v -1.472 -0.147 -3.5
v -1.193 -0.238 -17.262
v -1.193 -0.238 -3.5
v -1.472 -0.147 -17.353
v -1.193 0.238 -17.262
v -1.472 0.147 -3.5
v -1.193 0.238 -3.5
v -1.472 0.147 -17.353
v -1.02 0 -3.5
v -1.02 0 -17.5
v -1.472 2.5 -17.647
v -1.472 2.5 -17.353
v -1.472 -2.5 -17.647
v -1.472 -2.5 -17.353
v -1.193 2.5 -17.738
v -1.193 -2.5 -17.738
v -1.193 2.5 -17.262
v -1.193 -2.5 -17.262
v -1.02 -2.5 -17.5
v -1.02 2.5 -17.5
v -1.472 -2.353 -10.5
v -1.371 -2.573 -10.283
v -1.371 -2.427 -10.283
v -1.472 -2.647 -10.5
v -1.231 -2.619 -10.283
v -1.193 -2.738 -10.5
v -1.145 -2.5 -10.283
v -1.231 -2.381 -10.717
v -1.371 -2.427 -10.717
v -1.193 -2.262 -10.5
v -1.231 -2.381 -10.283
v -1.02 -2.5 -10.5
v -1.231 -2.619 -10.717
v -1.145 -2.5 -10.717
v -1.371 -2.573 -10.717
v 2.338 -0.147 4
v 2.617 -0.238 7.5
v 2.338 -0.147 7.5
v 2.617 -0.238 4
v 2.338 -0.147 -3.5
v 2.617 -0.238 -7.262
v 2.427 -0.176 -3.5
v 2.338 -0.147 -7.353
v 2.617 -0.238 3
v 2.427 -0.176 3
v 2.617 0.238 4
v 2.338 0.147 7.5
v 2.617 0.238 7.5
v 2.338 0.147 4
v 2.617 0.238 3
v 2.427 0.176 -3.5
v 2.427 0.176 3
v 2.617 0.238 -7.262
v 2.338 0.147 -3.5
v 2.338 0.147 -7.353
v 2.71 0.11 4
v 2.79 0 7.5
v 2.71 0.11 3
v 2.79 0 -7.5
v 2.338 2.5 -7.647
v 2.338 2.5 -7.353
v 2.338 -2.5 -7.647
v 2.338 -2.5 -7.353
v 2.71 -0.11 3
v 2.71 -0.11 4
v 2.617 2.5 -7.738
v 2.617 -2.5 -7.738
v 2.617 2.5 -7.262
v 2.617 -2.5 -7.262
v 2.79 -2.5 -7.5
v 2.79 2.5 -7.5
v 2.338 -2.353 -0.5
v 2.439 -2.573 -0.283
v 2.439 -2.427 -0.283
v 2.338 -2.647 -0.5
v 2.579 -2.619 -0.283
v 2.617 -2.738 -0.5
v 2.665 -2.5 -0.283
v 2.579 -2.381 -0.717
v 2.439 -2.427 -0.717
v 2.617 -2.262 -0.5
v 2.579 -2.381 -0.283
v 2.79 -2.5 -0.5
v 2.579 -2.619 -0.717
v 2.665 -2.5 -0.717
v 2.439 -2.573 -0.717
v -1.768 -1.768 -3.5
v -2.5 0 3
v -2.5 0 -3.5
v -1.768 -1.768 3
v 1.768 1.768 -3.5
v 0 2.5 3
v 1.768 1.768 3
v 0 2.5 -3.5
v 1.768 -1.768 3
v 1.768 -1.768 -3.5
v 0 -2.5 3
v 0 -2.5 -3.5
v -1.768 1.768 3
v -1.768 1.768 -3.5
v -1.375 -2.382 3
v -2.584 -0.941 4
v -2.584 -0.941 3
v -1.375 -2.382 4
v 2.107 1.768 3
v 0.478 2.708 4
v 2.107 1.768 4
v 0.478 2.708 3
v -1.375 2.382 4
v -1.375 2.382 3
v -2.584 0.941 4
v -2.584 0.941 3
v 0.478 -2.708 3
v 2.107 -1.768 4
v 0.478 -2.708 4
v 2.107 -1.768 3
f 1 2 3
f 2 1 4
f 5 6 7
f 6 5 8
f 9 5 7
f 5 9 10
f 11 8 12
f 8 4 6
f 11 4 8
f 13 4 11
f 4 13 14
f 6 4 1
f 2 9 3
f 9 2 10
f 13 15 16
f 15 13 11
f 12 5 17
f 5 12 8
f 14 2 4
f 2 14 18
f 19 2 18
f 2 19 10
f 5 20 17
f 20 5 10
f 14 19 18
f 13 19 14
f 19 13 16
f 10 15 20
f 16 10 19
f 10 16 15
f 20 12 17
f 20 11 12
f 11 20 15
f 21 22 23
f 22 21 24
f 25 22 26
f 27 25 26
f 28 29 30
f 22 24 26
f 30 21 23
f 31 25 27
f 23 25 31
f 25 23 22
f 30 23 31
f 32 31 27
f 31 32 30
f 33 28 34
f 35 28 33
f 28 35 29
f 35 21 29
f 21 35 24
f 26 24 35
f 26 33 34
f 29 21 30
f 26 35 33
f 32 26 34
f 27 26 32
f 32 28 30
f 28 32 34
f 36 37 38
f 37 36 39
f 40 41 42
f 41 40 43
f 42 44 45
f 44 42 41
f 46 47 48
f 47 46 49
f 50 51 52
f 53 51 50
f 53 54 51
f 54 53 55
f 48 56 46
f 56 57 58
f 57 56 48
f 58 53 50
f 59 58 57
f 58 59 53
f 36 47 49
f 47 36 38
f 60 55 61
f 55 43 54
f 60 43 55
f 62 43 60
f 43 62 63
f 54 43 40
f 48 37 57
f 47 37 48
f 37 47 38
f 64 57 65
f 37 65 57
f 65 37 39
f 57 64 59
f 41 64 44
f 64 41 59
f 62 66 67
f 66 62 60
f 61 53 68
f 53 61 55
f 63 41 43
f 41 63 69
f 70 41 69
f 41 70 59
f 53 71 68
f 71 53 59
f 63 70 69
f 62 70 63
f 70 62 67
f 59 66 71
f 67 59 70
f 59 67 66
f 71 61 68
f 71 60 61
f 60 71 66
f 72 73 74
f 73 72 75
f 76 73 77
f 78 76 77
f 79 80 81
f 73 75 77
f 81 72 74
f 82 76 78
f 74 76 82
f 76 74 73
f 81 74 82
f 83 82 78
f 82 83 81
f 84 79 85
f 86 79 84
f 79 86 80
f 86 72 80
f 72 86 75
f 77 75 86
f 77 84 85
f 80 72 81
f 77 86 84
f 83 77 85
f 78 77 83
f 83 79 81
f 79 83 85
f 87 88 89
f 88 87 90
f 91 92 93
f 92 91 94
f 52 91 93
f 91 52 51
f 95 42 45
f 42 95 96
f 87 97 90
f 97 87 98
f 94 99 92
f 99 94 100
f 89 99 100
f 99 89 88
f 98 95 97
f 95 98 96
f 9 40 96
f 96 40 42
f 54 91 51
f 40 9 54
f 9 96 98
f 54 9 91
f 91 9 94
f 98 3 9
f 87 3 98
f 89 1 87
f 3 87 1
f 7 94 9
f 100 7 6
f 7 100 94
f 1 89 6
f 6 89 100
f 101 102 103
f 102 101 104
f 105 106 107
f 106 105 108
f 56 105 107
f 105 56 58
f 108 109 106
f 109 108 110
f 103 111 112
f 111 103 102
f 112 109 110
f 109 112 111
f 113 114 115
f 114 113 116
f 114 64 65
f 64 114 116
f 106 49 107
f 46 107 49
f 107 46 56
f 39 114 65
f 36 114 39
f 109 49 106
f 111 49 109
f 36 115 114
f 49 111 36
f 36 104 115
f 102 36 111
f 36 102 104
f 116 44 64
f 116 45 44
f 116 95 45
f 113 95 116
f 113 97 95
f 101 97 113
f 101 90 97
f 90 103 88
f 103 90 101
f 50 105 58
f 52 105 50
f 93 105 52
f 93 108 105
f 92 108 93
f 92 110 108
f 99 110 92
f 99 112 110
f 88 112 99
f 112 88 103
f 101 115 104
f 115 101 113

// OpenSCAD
// Parameters for the LED model
module led(led_type="5mm", body_color=[1, 0, 0], lead_length=20, right_angle_bend=false) {
    led_body(led_type, body_color);
    led_rim(led_type);
    leads(led_type, lead_length, right_angle_bend);
}

// LED body module
module led_body(led_type, body_color) {
    color(body_color)
    if (led_type == "5mm") {
        cylinder(h=7, d=5, center=true);
    } else if (led_type == "3mm") {
        cylinder(h=5, d=3, center=true);
    }
}

// LED rim module
module led_rim(led_type) {
    if (led_type == "5mm") {
        translate([0, 0, 3.5])
        cylinder(h=1, d=5.5, center=true);
    } else if (led_type == "3mm") {
        translate([0, 0, 2.5])
        cylinder(h=1, d=3.5, center=true);
    }
}

// Leads module
module leads(led_type, lead_length, right_angle_bend) {
    lead_diameter = 0.5;
    lead_spacing = 2.54;
    translate([-lead_spacing/2, 0, -lead_length/2])
    lead(lead_length, lead_diameter, right_angle_bend);
    translate([lead_spacing, 0, 0])
    lead(lead_length, lead_diameter, right_angle_bend);
}

// Single lead module
module lead(lead_length, lead_diameter, right_angle_bend) {
    if (right_angle_bend) {
        lead_bend_right_angle(lead_length, lead_diameter);
    } else {
        cylinder(h=lead_length, d=lead_diameter, center=true);
        translate([0, 0, -lead_length/2])
        solder_end_detail(lead_diameter);
    }
}

// Right-angle lead bend module
module lead_bend_right_angle(lead_length, lead_diameter) {
    bend_length = 5;
    cylinder(h=lead_length - bend_length, d=lead_diameter, center=true);
    translate([0, 0, -lead_length/2 + bend_length/2])
    rotate([90, 0, 0])
    cylinder(h=bend_length, d=lead_diameter, center=true);
    translate([0, -bend_length/2, 0])
    solder_end_detail(lead_diameter);
}

// Solder end detail module
module solder_end_detail(lead_diameter) {
    translate([0, 0, -lead_diameter])
    sphere(d=lead_diameter);
}

// Example usage
led(led_type="5mm", body_color=[0, 1, 0], lead_length=20, right_angle_bend=true);
